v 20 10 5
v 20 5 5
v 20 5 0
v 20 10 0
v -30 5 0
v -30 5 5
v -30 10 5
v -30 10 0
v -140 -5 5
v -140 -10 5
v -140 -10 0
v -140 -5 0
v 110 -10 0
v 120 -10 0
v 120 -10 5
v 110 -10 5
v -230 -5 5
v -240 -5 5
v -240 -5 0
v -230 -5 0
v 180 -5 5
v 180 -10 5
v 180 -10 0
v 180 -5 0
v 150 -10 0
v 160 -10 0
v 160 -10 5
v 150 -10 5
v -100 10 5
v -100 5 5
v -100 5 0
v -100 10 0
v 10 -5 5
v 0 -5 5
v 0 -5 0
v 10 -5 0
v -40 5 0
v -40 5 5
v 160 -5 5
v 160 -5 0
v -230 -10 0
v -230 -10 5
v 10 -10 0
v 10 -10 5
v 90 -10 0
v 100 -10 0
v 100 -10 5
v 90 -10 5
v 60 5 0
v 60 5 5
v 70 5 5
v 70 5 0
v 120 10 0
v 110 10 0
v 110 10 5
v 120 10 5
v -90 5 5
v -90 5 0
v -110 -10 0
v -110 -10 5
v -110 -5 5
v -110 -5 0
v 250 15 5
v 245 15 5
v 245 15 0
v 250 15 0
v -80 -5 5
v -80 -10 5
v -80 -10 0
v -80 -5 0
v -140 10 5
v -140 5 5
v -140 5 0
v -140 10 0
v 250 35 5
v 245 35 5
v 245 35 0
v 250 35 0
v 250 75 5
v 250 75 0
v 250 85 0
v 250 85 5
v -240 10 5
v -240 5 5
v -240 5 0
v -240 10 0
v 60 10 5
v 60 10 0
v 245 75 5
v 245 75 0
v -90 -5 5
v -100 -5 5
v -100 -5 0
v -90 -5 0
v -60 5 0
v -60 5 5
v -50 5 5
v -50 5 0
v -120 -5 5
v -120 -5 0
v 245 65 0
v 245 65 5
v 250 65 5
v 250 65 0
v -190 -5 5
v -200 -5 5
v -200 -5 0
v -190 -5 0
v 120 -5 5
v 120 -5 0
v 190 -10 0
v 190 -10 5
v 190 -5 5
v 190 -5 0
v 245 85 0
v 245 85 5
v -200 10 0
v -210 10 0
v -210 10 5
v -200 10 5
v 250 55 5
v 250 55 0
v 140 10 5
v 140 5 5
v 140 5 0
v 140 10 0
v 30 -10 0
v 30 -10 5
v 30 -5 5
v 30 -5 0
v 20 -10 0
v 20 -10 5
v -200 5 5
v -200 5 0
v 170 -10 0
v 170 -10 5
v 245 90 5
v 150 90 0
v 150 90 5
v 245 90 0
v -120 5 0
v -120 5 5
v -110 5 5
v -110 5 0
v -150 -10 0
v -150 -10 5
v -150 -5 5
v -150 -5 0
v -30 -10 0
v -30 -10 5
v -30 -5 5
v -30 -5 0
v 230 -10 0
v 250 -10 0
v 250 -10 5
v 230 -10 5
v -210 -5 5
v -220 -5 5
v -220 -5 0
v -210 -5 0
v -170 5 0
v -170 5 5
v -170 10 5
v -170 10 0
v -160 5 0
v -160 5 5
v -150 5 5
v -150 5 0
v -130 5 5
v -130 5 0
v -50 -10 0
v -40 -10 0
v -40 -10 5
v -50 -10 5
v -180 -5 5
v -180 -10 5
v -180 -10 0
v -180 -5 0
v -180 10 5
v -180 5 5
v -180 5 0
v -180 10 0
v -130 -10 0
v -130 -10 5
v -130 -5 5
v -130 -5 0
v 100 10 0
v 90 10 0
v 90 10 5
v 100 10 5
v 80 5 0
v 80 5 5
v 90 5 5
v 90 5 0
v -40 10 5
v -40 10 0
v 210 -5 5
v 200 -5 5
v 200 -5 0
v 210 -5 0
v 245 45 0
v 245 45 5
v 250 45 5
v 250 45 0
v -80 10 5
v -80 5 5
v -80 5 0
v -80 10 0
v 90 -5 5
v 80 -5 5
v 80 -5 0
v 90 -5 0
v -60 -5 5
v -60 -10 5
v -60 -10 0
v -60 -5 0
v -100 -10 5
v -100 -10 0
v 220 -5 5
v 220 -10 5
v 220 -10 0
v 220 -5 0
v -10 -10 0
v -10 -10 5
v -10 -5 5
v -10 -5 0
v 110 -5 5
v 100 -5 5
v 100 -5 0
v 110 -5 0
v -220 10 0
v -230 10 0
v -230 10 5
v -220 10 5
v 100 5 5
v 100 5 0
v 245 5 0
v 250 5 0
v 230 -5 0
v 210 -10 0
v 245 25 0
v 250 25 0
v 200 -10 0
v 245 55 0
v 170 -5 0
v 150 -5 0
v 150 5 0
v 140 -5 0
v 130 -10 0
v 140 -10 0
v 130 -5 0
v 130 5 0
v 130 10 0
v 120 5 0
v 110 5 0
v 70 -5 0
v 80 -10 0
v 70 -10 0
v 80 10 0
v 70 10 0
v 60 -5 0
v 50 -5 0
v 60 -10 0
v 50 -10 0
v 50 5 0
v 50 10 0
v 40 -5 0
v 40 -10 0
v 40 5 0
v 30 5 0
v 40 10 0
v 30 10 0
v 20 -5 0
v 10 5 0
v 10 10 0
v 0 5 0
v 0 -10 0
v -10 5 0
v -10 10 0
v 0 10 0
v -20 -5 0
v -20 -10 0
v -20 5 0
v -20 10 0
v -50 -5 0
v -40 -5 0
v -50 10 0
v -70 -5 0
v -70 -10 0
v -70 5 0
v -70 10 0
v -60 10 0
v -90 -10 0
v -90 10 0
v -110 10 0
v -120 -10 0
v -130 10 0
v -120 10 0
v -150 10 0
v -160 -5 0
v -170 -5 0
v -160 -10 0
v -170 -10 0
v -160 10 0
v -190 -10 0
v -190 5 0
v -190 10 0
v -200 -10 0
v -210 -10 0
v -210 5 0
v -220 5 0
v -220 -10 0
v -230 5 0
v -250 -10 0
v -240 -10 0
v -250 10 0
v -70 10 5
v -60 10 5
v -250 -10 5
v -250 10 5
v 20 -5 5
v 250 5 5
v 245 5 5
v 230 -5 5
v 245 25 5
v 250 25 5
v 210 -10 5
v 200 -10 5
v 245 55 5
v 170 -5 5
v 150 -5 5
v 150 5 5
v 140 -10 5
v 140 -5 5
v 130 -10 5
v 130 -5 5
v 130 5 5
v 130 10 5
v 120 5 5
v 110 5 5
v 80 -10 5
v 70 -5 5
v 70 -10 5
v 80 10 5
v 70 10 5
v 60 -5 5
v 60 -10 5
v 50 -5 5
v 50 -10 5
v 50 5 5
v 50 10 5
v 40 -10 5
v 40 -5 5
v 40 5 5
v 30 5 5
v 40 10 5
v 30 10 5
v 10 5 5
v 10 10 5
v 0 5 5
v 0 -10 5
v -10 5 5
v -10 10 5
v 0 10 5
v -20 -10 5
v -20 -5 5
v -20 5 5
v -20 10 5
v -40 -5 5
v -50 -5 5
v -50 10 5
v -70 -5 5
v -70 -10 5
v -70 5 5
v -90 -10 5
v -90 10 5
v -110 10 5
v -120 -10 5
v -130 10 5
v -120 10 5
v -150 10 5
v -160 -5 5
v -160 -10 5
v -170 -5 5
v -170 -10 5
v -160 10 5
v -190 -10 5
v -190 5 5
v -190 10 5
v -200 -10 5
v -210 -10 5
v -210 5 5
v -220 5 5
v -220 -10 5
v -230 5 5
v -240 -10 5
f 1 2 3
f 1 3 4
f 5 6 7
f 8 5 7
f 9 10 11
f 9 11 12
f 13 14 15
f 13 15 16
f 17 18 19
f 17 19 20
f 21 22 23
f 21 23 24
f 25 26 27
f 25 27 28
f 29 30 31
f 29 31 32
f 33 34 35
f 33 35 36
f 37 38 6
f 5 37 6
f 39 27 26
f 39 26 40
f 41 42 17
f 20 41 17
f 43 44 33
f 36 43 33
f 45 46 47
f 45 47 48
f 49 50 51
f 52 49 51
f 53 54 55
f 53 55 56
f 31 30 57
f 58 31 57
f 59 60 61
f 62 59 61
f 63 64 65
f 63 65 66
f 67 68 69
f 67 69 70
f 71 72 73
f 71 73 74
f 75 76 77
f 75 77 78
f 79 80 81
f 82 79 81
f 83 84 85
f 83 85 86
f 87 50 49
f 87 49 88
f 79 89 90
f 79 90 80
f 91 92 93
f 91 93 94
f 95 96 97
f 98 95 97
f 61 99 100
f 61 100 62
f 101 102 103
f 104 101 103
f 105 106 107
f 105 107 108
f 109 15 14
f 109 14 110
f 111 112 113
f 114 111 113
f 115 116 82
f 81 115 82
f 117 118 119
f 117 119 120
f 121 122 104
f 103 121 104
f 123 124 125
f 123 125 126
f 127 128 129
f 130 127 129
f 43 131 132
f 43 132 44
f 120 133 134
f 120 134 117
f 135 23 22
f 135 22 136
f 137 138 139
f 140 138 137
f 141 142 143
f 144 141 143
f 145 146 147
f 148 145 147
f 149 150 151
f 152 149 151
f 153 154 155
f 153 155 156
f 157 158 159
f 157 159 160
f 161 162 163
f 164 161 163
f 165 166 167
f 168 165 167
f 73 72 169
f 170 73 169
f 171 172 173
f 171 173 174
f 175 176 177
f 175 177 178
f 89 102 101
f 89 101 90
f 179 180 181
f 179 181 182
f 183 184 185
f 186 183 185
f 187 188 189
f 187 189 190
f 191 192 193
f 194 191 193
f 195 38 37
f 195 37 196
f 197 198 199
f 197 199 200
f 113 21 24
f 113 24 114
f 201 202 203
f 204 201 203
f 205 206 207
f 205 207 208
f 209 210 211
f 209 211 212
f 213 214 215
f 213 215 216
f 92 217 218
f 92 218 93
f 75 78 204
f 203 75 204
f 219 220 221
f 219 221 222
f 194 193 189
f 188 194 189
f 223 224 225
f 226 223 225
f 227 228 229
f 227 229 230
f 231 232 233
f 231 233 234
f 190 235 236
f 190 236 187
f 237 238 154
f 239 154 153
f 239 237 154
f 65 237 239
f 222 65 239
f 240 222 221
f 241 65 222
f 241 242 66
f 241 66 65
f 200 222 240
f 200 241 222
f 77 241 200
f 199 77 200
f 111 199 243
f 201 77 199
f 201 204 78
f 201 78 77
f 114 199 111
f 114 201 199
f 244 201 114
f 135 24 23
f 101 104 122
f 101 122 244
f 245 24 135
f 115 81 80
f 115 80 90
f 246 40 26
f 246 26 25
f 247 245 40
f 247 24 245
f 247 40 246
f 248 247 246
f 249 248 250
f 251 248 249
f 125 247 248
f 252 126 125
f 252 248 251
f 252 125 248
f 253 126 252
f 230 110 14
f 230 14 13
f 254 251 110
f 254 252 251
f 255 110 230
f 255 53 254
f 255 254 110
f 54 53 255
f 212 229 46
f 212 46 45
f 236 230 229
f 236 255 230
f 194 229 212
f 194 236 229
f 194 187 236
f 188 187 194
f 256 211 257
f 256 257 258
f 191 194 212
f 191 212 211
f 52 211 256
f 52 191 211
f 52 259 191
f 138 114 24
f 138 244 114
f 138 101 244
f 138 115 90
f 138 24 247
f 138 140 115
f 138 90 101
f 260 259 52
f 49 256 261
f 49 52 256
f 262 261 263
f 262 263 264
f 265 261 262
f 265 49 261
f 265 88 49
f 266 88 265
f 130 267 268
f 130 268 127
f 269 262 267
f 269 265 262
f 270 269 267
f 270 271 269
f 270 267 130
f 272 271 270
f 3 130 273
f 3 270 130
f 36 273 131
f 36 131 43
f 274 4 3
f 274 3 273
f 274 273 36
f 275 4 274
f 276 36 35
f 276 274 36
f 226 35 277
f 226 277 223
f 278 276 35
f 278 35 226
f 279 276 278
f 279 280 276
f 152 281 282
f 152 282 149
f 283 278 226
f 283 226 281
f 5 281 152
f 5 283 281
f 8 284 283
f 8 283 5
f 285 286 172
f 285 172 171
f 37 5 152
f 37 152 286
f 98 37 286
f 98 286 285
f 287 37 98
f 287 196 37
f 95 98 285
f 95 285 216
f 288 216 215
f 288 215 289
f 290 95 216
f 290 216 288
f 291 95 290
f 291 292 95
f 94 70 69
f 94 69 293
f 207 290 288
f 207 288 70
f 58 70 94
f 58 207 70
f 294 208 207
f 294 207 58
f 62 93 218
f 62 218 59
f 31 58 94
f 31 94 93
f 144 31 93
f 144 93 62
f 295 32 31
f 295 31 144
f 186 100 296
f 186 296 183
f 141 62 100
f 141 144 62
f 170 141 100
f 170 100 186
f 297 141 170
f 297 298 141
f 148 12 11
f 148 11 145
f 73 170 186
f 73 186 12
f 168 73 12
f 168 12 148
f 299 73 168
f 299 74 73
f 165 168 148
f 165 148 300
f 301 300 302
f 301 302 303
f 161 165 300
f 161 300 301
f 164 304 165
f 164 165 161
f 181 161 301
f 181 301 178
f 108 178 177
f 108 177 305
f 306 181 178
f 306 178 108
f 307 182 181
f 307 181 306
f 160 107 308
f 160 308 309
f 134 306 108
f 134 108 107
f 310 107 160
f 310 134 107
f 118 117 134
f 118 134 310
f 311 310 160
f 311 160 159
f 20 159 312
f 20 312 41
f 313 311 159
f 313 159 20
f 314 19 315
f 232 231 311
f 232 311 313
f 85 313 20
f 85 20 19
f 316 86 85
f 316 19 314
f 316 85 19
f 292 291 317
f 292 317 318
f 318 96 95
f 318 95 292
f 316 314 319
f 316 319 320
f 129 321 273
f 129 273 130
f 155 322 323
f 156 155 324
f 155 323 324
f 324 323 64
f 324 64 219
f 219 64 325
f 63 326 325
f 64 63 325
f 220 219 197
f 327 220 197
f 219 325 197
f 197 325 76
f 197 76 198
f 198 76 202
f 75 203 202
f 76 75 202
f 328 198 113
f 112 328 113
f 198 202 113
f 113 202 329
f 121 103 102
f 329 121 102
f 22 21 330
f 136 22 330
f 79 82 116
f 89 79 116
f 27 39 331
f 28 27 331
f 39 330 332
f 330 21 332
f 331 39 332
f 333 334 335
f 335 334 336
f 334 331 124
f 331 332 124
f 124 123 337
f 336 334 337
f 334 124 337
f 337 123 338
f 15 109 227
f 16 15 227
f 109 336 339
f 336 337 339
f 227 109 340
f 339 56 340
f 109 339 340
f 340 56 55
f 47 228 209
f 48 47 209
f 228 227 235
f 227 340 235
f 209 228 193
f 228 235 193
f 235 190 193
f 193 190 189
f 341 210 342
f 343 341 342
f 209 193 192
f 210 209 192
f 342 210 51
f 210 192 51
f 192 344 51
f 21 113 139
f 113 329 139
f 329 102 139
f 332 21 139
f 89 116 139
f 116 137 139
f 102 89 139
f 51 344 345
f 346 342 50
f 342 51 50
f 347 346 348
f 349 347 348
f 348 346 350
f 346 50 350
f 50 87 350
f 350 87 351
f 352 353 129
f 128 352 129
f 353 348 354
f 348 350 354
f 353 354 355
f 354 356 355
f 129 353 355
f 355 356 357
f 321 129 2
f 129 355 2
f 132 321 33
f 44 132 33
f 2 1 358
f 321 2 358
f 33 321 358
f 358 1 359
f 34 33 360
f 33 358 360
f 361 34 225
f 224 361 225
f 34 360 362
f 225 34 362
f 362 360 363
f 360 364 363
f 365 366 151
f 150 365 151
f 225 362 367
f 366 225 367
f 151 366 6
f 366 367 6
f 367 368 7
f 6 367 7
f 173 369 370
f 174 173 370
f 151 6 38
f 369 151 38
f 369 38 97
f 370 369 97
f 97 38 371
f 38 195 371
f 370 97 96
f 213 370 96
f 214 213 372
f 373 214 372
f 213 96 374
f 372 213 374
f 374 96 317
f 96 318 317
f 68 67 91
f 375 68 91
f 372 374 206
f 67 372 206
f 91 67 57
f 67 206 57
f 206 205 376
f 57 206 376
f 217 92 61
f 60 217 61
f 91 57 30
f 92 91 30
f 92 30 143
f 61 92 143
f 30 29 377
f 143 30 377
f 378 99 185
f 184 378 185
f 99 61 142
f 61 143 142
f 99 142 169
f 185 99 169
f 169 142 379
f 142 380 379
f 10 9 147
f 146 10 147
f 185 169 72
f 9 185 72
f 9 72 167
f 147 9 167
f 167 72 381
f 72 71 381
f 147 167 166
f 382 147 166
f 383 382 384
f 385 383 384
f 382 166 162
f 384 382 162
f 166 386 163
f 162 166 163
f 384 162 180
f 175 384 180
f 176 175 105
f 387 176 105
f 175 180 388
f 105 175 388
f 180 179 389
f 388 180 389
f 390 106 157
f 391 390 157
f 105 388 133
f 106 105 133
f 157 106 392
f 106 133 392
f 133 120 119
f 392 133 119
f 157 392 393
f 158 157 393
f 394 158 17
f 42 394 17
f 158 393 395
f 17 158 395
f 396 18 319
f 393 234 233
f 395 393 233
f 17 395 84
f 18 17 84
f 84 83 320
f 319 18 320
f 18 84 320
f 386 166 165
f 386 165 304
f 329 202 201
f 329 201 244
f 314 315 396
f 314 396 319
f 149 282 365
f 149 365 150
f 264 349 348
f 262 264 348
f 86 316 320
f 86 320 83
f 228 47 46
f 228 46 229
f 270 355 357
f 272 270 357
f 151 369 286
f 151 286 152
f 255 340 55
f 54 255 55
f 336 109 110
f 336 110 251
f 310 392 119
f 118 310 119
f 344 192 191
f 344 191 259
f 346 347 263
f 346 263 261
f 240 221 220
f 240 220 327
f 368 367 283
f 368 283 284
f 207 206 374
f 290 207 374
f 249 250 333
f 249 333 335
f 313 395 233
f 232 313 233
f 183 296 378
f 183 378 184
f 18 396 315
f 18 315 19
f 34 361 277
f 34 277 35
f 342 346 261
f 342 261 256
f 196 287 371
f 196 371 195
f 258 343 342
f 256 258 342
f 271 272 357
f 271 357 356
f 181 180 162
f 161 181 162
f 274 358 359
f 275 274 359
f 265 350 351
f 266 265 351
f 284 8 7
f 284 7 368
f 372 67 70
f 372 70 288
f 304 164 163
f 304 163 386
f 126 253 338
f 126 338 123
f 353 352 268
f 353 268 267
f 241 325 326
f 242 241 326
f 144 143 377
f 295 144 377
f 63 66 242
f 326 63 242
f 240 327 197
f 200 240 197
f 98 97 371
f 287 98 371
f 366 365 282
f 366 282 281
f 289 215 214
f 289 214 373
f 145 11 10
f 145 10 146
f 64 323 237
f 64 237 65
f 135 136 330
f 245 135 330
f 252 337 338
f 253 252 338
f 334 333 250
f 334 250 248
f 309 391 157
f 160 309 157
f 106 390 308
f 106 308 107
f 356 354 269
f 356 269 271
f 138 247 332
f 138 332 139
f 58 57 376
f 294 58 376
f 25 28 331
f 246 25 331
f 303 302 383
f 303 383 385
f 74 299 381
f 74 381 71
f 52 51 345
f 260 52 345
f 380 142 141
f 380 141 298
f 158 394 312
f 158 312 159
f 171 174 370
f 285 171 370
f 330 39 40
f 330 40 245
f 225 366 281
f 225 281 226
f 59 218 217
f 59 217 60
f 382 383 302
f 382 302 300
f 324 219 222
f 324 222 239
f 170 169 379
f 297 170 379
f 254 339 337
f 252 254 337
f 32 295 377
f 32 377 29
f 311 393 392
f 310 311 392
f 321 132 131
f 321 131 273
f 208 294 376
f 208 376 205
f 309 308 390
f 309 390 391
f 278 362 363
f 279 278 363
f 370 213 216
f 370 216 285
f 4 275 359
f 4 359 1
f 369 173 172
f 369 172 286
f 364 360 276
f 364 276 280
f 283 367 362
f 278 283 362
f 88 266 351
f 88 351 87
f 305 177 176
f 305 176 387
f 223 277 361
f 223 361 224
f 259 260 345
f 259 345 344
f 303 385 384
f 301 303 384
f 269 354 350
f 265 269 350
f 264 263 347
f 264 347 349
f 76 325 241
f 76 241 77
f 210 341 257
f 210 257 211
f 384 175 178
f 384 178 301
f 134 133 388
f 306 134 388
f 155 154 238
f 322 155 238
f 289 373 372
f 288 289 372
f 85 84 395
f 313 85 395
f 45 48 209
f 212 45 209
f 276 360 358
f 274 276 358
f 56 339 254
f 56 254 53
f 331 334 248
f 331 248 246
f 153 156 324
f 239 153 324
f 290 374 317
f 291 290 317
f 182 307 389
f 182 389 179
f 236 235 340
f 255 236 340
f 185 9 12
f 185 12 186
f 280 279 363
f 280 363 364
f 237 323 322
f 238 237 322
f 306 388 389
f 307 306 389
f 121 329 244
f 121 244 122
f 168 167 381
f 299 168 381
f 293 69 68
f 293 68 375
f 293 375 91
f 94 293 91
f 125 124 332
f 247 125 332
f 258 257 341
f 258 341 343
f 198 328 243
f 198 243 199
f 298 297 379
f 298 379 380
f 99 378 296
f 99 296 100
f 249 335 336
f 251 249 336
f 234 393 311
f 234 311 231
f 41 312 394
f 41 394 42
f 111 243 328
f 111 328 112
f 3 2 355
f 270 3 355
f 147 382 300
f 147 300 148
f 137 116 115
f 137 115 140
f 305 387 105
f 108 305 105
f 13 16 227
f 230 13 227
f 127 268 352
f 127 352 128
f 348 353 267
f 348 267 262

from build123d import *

# Parameters (mm, degrees)
BOSS_EXTRU_1_DEPTH      = 5
ESQUISSE2_W             = 10
ESQUISSE2_H             = 5
ESQUISSE2_W_2           = 5
ESQUISSE2_H_2           = 10
ENL_V_MAT_EXTRU_2_DEPTH = 266.753645318


with BuildPart() as part:
    # Esquisse1 → Boss.-Extru.1 (new body)
    with BuildSketch(Plane.XY):
        Polygon((-250, 10), (150, 10), (150, 90), (250, 90), (250, 10), (250, -10), (-250, -10), align=None)
    extrude(amount=BOSS_EXTRU_1_DEPTH)

    # Esquisse2 → Enlèv. mat.-Extru.2 (cut, through all)
    with BuildSketch(Plane.XY.offset(5)):
        with Locations((-235, 7.5)):
            Rectangle(ESQUISSE2_W, ESQUISSE2_H)
        with Locations((-235, -7.5)):
            Rectangle(ESQUISSE2_W, ESQUISSE2_H)
        with Locations((-215, 7.5)):
            Rectangle(ESQUISSE2_W, ESQUISSE2_H)
        with Locations((-215, -7.5)):
            Rectangle(ESQUISSE2_W, ESQUISSE2_H)
        with Locations((-195, 7.5)):
            Rectangle(ESQUISSE2_W, ESQUISSE2_H)
        with Locations((-195, -7.5)):
            Rectangle(ESQUISSE2_W, ESQUISSE2_H)
        with Locations((-175, 7.5)):
            Rectangle(ESQUISSE2_W, ESQUISSE2_H)
        with Locations((-175, -7.5)):
            Rectangle(ESQUISSE2_W, ESQUISSE2_H)
        with Locations((-155, 7.5)):
            Rectangle(ESQUISSE2_W, ESQUISSE2_H)
        with Locations((-155, -7.5)):
            Rectangle(ESQUISSE2_W, ESQUISSE2_H)
        with Locations((-135, 7.5)):
            Rectangle(ESQUISSE2_W, ESQUISSE2_H)
        with Locations((-135, -7.5)):
            Rectangle(ESQUISSE2_W, ESQUISSE2_H)
        with Locations((-115, 7.5)):
            Rectangle(ESQUISSE2_W, ESQUISSE2_H)
        with Locations((-115, -7.5)):
            Rectangle(ESQUISSE2_W, ESQUISSE2_H)
        with Locations((-95, 7.5)):
            Rectangle(ESQUISSE2_W, ESQUISSE2_H)
        with Locations((-95, -7.5)):
            Rectangle(ESQUISSE2_W, ESQUISSE2_H)
        with Locations((-75, 7.5)):
            Rectangle(ESQUISSE2_W, ESQUISSE2_H)
        with Locations((-75, -7.5)):
            Rectangle(ESQUISSE2_W, ESQUISSE2_H)
        with Locations((-55, 7.5)):
            Rectangle(ESQUISSE2_W, ESQUISSE2_H)
        with Locations((-55, -7.5)):
            Rectangle(ESQUISSE2_W, ESQUISSE2_H)
        with Locations((-35, 7.5)):
            Rectangle(ESQUISSE2_W, ESQUISSE2_H)
        with Locations((-35, -7.5)):
            Rectangle(ESQUISSE2_W, ESQUISSE2_H)
        with Locations((-15, 7.5)):
            Rectangle(ESQUISSE2_W, ESQUISSE2_H)
        with Locations((-15, -7.5)):
            Rectangle(ESQUISSE2_W, ESQUISSE2_H)
        with Locations((5, 7.5)):
            Rectangle(ESQUISSE2_W, ESQUISSE2_H)
        with Locations((5, -7.5)):
            Rectangle(ESQUISSE2_W, ESQUISSE2_H)
        with Locations((25, 7.5)):
            Rectangle(ESQUISSE2_W, ESQUISSE2_H)
        with Locations((25, -7.5)):
            Rectangle(ESQUISSE2_W, ESQUISSE2_H)
        with Locations((45, 7.5)):
            Rectangle(ESQUISSE2_W, ESQUISSE2_H)
        with Locations((45, -7.5)):
            Rectangle(ESQUISSE2_W, ESQUISSE2_H)
        with Locations((65, 7.5)):
            Rectangle(ESQUISSE2_W, ESQUISSE2_H)
        with Locations((65, -7.5)):
            Rectangle(ESQUISSE2_W, ESQUISSE2_H)
        with Locations((85, 7.5)):
            Rectangle(ESQUISSE2_W, ESQUISSE2_H)
        with Locations((85, -7.5)):
            Rectangle(ESQUISSE2_W, ESQUISSE2_H)
        with Locations((105, 7.5)):
            Rectangle(ESQUISSE2_W, ESQUISSE2_H)
        with Locations((105, -7.5)):
            Rectangle(ESQUISSE2_W, ESQUISSE2_H)
        with Locations((125, 7.5)):
            Rectangle(ESQUISSE2_W, ESQUISSE2_H)
        with Locations((125, -7.5)):
            Rectangle(ESQUISSE2_W, ESQUISSE2_H)
        with Locations((145, 7.5)):
            Rectangle(ESQUISSE2_W, ESQUISSE2_H)
        with Locations((145, -7.5)):
            Rectangle(ESQUISSE2_W, ESQUISSE2_H)
        with Locations((165, -7.5)):
            Rectangle(ESQUISSE2_W, ESQUISSE2_H)
        with Locations((185, -7.5)):
            Rectangle(ESQUISSE2_W, ESQUISSE2_H)
        with Locations((205, -7.5)):
            Rectangle(ESQUISSE2_W, ESQUISSE2_H)
        with Locations((225, -7.5)):
            Rectangle(ESQUISSE2_W, ESQUISSE2_H)
        with Locations((247.5, 10)):
            Rectangle(ESQUISSE2_W_2, ESQUISSE2_H_2)
        with Locations((247.5, 30)):
            Rectangle(ESQUISSE2_W_2, ESQUISSE2_H_2)
        with Locations((247.5, 50)):
            Rectangle(ESQUISSE2_W_2, ESQUISSE2_H_2)
        with Locations((247.5, 70)):
            Rectangle(ESQUISSE2_W_2, ESQUISSE2_H_2)
        with Locations((247.5, 90)):
            Rectangle(ESQUISSE2_W_2, ESQUISSE2_H_2)
    extrude(amount=-ENL_V_MAT_EXTRU_2_DEPTH, mode=Mode.SUBTRACT)


solid = part.part
